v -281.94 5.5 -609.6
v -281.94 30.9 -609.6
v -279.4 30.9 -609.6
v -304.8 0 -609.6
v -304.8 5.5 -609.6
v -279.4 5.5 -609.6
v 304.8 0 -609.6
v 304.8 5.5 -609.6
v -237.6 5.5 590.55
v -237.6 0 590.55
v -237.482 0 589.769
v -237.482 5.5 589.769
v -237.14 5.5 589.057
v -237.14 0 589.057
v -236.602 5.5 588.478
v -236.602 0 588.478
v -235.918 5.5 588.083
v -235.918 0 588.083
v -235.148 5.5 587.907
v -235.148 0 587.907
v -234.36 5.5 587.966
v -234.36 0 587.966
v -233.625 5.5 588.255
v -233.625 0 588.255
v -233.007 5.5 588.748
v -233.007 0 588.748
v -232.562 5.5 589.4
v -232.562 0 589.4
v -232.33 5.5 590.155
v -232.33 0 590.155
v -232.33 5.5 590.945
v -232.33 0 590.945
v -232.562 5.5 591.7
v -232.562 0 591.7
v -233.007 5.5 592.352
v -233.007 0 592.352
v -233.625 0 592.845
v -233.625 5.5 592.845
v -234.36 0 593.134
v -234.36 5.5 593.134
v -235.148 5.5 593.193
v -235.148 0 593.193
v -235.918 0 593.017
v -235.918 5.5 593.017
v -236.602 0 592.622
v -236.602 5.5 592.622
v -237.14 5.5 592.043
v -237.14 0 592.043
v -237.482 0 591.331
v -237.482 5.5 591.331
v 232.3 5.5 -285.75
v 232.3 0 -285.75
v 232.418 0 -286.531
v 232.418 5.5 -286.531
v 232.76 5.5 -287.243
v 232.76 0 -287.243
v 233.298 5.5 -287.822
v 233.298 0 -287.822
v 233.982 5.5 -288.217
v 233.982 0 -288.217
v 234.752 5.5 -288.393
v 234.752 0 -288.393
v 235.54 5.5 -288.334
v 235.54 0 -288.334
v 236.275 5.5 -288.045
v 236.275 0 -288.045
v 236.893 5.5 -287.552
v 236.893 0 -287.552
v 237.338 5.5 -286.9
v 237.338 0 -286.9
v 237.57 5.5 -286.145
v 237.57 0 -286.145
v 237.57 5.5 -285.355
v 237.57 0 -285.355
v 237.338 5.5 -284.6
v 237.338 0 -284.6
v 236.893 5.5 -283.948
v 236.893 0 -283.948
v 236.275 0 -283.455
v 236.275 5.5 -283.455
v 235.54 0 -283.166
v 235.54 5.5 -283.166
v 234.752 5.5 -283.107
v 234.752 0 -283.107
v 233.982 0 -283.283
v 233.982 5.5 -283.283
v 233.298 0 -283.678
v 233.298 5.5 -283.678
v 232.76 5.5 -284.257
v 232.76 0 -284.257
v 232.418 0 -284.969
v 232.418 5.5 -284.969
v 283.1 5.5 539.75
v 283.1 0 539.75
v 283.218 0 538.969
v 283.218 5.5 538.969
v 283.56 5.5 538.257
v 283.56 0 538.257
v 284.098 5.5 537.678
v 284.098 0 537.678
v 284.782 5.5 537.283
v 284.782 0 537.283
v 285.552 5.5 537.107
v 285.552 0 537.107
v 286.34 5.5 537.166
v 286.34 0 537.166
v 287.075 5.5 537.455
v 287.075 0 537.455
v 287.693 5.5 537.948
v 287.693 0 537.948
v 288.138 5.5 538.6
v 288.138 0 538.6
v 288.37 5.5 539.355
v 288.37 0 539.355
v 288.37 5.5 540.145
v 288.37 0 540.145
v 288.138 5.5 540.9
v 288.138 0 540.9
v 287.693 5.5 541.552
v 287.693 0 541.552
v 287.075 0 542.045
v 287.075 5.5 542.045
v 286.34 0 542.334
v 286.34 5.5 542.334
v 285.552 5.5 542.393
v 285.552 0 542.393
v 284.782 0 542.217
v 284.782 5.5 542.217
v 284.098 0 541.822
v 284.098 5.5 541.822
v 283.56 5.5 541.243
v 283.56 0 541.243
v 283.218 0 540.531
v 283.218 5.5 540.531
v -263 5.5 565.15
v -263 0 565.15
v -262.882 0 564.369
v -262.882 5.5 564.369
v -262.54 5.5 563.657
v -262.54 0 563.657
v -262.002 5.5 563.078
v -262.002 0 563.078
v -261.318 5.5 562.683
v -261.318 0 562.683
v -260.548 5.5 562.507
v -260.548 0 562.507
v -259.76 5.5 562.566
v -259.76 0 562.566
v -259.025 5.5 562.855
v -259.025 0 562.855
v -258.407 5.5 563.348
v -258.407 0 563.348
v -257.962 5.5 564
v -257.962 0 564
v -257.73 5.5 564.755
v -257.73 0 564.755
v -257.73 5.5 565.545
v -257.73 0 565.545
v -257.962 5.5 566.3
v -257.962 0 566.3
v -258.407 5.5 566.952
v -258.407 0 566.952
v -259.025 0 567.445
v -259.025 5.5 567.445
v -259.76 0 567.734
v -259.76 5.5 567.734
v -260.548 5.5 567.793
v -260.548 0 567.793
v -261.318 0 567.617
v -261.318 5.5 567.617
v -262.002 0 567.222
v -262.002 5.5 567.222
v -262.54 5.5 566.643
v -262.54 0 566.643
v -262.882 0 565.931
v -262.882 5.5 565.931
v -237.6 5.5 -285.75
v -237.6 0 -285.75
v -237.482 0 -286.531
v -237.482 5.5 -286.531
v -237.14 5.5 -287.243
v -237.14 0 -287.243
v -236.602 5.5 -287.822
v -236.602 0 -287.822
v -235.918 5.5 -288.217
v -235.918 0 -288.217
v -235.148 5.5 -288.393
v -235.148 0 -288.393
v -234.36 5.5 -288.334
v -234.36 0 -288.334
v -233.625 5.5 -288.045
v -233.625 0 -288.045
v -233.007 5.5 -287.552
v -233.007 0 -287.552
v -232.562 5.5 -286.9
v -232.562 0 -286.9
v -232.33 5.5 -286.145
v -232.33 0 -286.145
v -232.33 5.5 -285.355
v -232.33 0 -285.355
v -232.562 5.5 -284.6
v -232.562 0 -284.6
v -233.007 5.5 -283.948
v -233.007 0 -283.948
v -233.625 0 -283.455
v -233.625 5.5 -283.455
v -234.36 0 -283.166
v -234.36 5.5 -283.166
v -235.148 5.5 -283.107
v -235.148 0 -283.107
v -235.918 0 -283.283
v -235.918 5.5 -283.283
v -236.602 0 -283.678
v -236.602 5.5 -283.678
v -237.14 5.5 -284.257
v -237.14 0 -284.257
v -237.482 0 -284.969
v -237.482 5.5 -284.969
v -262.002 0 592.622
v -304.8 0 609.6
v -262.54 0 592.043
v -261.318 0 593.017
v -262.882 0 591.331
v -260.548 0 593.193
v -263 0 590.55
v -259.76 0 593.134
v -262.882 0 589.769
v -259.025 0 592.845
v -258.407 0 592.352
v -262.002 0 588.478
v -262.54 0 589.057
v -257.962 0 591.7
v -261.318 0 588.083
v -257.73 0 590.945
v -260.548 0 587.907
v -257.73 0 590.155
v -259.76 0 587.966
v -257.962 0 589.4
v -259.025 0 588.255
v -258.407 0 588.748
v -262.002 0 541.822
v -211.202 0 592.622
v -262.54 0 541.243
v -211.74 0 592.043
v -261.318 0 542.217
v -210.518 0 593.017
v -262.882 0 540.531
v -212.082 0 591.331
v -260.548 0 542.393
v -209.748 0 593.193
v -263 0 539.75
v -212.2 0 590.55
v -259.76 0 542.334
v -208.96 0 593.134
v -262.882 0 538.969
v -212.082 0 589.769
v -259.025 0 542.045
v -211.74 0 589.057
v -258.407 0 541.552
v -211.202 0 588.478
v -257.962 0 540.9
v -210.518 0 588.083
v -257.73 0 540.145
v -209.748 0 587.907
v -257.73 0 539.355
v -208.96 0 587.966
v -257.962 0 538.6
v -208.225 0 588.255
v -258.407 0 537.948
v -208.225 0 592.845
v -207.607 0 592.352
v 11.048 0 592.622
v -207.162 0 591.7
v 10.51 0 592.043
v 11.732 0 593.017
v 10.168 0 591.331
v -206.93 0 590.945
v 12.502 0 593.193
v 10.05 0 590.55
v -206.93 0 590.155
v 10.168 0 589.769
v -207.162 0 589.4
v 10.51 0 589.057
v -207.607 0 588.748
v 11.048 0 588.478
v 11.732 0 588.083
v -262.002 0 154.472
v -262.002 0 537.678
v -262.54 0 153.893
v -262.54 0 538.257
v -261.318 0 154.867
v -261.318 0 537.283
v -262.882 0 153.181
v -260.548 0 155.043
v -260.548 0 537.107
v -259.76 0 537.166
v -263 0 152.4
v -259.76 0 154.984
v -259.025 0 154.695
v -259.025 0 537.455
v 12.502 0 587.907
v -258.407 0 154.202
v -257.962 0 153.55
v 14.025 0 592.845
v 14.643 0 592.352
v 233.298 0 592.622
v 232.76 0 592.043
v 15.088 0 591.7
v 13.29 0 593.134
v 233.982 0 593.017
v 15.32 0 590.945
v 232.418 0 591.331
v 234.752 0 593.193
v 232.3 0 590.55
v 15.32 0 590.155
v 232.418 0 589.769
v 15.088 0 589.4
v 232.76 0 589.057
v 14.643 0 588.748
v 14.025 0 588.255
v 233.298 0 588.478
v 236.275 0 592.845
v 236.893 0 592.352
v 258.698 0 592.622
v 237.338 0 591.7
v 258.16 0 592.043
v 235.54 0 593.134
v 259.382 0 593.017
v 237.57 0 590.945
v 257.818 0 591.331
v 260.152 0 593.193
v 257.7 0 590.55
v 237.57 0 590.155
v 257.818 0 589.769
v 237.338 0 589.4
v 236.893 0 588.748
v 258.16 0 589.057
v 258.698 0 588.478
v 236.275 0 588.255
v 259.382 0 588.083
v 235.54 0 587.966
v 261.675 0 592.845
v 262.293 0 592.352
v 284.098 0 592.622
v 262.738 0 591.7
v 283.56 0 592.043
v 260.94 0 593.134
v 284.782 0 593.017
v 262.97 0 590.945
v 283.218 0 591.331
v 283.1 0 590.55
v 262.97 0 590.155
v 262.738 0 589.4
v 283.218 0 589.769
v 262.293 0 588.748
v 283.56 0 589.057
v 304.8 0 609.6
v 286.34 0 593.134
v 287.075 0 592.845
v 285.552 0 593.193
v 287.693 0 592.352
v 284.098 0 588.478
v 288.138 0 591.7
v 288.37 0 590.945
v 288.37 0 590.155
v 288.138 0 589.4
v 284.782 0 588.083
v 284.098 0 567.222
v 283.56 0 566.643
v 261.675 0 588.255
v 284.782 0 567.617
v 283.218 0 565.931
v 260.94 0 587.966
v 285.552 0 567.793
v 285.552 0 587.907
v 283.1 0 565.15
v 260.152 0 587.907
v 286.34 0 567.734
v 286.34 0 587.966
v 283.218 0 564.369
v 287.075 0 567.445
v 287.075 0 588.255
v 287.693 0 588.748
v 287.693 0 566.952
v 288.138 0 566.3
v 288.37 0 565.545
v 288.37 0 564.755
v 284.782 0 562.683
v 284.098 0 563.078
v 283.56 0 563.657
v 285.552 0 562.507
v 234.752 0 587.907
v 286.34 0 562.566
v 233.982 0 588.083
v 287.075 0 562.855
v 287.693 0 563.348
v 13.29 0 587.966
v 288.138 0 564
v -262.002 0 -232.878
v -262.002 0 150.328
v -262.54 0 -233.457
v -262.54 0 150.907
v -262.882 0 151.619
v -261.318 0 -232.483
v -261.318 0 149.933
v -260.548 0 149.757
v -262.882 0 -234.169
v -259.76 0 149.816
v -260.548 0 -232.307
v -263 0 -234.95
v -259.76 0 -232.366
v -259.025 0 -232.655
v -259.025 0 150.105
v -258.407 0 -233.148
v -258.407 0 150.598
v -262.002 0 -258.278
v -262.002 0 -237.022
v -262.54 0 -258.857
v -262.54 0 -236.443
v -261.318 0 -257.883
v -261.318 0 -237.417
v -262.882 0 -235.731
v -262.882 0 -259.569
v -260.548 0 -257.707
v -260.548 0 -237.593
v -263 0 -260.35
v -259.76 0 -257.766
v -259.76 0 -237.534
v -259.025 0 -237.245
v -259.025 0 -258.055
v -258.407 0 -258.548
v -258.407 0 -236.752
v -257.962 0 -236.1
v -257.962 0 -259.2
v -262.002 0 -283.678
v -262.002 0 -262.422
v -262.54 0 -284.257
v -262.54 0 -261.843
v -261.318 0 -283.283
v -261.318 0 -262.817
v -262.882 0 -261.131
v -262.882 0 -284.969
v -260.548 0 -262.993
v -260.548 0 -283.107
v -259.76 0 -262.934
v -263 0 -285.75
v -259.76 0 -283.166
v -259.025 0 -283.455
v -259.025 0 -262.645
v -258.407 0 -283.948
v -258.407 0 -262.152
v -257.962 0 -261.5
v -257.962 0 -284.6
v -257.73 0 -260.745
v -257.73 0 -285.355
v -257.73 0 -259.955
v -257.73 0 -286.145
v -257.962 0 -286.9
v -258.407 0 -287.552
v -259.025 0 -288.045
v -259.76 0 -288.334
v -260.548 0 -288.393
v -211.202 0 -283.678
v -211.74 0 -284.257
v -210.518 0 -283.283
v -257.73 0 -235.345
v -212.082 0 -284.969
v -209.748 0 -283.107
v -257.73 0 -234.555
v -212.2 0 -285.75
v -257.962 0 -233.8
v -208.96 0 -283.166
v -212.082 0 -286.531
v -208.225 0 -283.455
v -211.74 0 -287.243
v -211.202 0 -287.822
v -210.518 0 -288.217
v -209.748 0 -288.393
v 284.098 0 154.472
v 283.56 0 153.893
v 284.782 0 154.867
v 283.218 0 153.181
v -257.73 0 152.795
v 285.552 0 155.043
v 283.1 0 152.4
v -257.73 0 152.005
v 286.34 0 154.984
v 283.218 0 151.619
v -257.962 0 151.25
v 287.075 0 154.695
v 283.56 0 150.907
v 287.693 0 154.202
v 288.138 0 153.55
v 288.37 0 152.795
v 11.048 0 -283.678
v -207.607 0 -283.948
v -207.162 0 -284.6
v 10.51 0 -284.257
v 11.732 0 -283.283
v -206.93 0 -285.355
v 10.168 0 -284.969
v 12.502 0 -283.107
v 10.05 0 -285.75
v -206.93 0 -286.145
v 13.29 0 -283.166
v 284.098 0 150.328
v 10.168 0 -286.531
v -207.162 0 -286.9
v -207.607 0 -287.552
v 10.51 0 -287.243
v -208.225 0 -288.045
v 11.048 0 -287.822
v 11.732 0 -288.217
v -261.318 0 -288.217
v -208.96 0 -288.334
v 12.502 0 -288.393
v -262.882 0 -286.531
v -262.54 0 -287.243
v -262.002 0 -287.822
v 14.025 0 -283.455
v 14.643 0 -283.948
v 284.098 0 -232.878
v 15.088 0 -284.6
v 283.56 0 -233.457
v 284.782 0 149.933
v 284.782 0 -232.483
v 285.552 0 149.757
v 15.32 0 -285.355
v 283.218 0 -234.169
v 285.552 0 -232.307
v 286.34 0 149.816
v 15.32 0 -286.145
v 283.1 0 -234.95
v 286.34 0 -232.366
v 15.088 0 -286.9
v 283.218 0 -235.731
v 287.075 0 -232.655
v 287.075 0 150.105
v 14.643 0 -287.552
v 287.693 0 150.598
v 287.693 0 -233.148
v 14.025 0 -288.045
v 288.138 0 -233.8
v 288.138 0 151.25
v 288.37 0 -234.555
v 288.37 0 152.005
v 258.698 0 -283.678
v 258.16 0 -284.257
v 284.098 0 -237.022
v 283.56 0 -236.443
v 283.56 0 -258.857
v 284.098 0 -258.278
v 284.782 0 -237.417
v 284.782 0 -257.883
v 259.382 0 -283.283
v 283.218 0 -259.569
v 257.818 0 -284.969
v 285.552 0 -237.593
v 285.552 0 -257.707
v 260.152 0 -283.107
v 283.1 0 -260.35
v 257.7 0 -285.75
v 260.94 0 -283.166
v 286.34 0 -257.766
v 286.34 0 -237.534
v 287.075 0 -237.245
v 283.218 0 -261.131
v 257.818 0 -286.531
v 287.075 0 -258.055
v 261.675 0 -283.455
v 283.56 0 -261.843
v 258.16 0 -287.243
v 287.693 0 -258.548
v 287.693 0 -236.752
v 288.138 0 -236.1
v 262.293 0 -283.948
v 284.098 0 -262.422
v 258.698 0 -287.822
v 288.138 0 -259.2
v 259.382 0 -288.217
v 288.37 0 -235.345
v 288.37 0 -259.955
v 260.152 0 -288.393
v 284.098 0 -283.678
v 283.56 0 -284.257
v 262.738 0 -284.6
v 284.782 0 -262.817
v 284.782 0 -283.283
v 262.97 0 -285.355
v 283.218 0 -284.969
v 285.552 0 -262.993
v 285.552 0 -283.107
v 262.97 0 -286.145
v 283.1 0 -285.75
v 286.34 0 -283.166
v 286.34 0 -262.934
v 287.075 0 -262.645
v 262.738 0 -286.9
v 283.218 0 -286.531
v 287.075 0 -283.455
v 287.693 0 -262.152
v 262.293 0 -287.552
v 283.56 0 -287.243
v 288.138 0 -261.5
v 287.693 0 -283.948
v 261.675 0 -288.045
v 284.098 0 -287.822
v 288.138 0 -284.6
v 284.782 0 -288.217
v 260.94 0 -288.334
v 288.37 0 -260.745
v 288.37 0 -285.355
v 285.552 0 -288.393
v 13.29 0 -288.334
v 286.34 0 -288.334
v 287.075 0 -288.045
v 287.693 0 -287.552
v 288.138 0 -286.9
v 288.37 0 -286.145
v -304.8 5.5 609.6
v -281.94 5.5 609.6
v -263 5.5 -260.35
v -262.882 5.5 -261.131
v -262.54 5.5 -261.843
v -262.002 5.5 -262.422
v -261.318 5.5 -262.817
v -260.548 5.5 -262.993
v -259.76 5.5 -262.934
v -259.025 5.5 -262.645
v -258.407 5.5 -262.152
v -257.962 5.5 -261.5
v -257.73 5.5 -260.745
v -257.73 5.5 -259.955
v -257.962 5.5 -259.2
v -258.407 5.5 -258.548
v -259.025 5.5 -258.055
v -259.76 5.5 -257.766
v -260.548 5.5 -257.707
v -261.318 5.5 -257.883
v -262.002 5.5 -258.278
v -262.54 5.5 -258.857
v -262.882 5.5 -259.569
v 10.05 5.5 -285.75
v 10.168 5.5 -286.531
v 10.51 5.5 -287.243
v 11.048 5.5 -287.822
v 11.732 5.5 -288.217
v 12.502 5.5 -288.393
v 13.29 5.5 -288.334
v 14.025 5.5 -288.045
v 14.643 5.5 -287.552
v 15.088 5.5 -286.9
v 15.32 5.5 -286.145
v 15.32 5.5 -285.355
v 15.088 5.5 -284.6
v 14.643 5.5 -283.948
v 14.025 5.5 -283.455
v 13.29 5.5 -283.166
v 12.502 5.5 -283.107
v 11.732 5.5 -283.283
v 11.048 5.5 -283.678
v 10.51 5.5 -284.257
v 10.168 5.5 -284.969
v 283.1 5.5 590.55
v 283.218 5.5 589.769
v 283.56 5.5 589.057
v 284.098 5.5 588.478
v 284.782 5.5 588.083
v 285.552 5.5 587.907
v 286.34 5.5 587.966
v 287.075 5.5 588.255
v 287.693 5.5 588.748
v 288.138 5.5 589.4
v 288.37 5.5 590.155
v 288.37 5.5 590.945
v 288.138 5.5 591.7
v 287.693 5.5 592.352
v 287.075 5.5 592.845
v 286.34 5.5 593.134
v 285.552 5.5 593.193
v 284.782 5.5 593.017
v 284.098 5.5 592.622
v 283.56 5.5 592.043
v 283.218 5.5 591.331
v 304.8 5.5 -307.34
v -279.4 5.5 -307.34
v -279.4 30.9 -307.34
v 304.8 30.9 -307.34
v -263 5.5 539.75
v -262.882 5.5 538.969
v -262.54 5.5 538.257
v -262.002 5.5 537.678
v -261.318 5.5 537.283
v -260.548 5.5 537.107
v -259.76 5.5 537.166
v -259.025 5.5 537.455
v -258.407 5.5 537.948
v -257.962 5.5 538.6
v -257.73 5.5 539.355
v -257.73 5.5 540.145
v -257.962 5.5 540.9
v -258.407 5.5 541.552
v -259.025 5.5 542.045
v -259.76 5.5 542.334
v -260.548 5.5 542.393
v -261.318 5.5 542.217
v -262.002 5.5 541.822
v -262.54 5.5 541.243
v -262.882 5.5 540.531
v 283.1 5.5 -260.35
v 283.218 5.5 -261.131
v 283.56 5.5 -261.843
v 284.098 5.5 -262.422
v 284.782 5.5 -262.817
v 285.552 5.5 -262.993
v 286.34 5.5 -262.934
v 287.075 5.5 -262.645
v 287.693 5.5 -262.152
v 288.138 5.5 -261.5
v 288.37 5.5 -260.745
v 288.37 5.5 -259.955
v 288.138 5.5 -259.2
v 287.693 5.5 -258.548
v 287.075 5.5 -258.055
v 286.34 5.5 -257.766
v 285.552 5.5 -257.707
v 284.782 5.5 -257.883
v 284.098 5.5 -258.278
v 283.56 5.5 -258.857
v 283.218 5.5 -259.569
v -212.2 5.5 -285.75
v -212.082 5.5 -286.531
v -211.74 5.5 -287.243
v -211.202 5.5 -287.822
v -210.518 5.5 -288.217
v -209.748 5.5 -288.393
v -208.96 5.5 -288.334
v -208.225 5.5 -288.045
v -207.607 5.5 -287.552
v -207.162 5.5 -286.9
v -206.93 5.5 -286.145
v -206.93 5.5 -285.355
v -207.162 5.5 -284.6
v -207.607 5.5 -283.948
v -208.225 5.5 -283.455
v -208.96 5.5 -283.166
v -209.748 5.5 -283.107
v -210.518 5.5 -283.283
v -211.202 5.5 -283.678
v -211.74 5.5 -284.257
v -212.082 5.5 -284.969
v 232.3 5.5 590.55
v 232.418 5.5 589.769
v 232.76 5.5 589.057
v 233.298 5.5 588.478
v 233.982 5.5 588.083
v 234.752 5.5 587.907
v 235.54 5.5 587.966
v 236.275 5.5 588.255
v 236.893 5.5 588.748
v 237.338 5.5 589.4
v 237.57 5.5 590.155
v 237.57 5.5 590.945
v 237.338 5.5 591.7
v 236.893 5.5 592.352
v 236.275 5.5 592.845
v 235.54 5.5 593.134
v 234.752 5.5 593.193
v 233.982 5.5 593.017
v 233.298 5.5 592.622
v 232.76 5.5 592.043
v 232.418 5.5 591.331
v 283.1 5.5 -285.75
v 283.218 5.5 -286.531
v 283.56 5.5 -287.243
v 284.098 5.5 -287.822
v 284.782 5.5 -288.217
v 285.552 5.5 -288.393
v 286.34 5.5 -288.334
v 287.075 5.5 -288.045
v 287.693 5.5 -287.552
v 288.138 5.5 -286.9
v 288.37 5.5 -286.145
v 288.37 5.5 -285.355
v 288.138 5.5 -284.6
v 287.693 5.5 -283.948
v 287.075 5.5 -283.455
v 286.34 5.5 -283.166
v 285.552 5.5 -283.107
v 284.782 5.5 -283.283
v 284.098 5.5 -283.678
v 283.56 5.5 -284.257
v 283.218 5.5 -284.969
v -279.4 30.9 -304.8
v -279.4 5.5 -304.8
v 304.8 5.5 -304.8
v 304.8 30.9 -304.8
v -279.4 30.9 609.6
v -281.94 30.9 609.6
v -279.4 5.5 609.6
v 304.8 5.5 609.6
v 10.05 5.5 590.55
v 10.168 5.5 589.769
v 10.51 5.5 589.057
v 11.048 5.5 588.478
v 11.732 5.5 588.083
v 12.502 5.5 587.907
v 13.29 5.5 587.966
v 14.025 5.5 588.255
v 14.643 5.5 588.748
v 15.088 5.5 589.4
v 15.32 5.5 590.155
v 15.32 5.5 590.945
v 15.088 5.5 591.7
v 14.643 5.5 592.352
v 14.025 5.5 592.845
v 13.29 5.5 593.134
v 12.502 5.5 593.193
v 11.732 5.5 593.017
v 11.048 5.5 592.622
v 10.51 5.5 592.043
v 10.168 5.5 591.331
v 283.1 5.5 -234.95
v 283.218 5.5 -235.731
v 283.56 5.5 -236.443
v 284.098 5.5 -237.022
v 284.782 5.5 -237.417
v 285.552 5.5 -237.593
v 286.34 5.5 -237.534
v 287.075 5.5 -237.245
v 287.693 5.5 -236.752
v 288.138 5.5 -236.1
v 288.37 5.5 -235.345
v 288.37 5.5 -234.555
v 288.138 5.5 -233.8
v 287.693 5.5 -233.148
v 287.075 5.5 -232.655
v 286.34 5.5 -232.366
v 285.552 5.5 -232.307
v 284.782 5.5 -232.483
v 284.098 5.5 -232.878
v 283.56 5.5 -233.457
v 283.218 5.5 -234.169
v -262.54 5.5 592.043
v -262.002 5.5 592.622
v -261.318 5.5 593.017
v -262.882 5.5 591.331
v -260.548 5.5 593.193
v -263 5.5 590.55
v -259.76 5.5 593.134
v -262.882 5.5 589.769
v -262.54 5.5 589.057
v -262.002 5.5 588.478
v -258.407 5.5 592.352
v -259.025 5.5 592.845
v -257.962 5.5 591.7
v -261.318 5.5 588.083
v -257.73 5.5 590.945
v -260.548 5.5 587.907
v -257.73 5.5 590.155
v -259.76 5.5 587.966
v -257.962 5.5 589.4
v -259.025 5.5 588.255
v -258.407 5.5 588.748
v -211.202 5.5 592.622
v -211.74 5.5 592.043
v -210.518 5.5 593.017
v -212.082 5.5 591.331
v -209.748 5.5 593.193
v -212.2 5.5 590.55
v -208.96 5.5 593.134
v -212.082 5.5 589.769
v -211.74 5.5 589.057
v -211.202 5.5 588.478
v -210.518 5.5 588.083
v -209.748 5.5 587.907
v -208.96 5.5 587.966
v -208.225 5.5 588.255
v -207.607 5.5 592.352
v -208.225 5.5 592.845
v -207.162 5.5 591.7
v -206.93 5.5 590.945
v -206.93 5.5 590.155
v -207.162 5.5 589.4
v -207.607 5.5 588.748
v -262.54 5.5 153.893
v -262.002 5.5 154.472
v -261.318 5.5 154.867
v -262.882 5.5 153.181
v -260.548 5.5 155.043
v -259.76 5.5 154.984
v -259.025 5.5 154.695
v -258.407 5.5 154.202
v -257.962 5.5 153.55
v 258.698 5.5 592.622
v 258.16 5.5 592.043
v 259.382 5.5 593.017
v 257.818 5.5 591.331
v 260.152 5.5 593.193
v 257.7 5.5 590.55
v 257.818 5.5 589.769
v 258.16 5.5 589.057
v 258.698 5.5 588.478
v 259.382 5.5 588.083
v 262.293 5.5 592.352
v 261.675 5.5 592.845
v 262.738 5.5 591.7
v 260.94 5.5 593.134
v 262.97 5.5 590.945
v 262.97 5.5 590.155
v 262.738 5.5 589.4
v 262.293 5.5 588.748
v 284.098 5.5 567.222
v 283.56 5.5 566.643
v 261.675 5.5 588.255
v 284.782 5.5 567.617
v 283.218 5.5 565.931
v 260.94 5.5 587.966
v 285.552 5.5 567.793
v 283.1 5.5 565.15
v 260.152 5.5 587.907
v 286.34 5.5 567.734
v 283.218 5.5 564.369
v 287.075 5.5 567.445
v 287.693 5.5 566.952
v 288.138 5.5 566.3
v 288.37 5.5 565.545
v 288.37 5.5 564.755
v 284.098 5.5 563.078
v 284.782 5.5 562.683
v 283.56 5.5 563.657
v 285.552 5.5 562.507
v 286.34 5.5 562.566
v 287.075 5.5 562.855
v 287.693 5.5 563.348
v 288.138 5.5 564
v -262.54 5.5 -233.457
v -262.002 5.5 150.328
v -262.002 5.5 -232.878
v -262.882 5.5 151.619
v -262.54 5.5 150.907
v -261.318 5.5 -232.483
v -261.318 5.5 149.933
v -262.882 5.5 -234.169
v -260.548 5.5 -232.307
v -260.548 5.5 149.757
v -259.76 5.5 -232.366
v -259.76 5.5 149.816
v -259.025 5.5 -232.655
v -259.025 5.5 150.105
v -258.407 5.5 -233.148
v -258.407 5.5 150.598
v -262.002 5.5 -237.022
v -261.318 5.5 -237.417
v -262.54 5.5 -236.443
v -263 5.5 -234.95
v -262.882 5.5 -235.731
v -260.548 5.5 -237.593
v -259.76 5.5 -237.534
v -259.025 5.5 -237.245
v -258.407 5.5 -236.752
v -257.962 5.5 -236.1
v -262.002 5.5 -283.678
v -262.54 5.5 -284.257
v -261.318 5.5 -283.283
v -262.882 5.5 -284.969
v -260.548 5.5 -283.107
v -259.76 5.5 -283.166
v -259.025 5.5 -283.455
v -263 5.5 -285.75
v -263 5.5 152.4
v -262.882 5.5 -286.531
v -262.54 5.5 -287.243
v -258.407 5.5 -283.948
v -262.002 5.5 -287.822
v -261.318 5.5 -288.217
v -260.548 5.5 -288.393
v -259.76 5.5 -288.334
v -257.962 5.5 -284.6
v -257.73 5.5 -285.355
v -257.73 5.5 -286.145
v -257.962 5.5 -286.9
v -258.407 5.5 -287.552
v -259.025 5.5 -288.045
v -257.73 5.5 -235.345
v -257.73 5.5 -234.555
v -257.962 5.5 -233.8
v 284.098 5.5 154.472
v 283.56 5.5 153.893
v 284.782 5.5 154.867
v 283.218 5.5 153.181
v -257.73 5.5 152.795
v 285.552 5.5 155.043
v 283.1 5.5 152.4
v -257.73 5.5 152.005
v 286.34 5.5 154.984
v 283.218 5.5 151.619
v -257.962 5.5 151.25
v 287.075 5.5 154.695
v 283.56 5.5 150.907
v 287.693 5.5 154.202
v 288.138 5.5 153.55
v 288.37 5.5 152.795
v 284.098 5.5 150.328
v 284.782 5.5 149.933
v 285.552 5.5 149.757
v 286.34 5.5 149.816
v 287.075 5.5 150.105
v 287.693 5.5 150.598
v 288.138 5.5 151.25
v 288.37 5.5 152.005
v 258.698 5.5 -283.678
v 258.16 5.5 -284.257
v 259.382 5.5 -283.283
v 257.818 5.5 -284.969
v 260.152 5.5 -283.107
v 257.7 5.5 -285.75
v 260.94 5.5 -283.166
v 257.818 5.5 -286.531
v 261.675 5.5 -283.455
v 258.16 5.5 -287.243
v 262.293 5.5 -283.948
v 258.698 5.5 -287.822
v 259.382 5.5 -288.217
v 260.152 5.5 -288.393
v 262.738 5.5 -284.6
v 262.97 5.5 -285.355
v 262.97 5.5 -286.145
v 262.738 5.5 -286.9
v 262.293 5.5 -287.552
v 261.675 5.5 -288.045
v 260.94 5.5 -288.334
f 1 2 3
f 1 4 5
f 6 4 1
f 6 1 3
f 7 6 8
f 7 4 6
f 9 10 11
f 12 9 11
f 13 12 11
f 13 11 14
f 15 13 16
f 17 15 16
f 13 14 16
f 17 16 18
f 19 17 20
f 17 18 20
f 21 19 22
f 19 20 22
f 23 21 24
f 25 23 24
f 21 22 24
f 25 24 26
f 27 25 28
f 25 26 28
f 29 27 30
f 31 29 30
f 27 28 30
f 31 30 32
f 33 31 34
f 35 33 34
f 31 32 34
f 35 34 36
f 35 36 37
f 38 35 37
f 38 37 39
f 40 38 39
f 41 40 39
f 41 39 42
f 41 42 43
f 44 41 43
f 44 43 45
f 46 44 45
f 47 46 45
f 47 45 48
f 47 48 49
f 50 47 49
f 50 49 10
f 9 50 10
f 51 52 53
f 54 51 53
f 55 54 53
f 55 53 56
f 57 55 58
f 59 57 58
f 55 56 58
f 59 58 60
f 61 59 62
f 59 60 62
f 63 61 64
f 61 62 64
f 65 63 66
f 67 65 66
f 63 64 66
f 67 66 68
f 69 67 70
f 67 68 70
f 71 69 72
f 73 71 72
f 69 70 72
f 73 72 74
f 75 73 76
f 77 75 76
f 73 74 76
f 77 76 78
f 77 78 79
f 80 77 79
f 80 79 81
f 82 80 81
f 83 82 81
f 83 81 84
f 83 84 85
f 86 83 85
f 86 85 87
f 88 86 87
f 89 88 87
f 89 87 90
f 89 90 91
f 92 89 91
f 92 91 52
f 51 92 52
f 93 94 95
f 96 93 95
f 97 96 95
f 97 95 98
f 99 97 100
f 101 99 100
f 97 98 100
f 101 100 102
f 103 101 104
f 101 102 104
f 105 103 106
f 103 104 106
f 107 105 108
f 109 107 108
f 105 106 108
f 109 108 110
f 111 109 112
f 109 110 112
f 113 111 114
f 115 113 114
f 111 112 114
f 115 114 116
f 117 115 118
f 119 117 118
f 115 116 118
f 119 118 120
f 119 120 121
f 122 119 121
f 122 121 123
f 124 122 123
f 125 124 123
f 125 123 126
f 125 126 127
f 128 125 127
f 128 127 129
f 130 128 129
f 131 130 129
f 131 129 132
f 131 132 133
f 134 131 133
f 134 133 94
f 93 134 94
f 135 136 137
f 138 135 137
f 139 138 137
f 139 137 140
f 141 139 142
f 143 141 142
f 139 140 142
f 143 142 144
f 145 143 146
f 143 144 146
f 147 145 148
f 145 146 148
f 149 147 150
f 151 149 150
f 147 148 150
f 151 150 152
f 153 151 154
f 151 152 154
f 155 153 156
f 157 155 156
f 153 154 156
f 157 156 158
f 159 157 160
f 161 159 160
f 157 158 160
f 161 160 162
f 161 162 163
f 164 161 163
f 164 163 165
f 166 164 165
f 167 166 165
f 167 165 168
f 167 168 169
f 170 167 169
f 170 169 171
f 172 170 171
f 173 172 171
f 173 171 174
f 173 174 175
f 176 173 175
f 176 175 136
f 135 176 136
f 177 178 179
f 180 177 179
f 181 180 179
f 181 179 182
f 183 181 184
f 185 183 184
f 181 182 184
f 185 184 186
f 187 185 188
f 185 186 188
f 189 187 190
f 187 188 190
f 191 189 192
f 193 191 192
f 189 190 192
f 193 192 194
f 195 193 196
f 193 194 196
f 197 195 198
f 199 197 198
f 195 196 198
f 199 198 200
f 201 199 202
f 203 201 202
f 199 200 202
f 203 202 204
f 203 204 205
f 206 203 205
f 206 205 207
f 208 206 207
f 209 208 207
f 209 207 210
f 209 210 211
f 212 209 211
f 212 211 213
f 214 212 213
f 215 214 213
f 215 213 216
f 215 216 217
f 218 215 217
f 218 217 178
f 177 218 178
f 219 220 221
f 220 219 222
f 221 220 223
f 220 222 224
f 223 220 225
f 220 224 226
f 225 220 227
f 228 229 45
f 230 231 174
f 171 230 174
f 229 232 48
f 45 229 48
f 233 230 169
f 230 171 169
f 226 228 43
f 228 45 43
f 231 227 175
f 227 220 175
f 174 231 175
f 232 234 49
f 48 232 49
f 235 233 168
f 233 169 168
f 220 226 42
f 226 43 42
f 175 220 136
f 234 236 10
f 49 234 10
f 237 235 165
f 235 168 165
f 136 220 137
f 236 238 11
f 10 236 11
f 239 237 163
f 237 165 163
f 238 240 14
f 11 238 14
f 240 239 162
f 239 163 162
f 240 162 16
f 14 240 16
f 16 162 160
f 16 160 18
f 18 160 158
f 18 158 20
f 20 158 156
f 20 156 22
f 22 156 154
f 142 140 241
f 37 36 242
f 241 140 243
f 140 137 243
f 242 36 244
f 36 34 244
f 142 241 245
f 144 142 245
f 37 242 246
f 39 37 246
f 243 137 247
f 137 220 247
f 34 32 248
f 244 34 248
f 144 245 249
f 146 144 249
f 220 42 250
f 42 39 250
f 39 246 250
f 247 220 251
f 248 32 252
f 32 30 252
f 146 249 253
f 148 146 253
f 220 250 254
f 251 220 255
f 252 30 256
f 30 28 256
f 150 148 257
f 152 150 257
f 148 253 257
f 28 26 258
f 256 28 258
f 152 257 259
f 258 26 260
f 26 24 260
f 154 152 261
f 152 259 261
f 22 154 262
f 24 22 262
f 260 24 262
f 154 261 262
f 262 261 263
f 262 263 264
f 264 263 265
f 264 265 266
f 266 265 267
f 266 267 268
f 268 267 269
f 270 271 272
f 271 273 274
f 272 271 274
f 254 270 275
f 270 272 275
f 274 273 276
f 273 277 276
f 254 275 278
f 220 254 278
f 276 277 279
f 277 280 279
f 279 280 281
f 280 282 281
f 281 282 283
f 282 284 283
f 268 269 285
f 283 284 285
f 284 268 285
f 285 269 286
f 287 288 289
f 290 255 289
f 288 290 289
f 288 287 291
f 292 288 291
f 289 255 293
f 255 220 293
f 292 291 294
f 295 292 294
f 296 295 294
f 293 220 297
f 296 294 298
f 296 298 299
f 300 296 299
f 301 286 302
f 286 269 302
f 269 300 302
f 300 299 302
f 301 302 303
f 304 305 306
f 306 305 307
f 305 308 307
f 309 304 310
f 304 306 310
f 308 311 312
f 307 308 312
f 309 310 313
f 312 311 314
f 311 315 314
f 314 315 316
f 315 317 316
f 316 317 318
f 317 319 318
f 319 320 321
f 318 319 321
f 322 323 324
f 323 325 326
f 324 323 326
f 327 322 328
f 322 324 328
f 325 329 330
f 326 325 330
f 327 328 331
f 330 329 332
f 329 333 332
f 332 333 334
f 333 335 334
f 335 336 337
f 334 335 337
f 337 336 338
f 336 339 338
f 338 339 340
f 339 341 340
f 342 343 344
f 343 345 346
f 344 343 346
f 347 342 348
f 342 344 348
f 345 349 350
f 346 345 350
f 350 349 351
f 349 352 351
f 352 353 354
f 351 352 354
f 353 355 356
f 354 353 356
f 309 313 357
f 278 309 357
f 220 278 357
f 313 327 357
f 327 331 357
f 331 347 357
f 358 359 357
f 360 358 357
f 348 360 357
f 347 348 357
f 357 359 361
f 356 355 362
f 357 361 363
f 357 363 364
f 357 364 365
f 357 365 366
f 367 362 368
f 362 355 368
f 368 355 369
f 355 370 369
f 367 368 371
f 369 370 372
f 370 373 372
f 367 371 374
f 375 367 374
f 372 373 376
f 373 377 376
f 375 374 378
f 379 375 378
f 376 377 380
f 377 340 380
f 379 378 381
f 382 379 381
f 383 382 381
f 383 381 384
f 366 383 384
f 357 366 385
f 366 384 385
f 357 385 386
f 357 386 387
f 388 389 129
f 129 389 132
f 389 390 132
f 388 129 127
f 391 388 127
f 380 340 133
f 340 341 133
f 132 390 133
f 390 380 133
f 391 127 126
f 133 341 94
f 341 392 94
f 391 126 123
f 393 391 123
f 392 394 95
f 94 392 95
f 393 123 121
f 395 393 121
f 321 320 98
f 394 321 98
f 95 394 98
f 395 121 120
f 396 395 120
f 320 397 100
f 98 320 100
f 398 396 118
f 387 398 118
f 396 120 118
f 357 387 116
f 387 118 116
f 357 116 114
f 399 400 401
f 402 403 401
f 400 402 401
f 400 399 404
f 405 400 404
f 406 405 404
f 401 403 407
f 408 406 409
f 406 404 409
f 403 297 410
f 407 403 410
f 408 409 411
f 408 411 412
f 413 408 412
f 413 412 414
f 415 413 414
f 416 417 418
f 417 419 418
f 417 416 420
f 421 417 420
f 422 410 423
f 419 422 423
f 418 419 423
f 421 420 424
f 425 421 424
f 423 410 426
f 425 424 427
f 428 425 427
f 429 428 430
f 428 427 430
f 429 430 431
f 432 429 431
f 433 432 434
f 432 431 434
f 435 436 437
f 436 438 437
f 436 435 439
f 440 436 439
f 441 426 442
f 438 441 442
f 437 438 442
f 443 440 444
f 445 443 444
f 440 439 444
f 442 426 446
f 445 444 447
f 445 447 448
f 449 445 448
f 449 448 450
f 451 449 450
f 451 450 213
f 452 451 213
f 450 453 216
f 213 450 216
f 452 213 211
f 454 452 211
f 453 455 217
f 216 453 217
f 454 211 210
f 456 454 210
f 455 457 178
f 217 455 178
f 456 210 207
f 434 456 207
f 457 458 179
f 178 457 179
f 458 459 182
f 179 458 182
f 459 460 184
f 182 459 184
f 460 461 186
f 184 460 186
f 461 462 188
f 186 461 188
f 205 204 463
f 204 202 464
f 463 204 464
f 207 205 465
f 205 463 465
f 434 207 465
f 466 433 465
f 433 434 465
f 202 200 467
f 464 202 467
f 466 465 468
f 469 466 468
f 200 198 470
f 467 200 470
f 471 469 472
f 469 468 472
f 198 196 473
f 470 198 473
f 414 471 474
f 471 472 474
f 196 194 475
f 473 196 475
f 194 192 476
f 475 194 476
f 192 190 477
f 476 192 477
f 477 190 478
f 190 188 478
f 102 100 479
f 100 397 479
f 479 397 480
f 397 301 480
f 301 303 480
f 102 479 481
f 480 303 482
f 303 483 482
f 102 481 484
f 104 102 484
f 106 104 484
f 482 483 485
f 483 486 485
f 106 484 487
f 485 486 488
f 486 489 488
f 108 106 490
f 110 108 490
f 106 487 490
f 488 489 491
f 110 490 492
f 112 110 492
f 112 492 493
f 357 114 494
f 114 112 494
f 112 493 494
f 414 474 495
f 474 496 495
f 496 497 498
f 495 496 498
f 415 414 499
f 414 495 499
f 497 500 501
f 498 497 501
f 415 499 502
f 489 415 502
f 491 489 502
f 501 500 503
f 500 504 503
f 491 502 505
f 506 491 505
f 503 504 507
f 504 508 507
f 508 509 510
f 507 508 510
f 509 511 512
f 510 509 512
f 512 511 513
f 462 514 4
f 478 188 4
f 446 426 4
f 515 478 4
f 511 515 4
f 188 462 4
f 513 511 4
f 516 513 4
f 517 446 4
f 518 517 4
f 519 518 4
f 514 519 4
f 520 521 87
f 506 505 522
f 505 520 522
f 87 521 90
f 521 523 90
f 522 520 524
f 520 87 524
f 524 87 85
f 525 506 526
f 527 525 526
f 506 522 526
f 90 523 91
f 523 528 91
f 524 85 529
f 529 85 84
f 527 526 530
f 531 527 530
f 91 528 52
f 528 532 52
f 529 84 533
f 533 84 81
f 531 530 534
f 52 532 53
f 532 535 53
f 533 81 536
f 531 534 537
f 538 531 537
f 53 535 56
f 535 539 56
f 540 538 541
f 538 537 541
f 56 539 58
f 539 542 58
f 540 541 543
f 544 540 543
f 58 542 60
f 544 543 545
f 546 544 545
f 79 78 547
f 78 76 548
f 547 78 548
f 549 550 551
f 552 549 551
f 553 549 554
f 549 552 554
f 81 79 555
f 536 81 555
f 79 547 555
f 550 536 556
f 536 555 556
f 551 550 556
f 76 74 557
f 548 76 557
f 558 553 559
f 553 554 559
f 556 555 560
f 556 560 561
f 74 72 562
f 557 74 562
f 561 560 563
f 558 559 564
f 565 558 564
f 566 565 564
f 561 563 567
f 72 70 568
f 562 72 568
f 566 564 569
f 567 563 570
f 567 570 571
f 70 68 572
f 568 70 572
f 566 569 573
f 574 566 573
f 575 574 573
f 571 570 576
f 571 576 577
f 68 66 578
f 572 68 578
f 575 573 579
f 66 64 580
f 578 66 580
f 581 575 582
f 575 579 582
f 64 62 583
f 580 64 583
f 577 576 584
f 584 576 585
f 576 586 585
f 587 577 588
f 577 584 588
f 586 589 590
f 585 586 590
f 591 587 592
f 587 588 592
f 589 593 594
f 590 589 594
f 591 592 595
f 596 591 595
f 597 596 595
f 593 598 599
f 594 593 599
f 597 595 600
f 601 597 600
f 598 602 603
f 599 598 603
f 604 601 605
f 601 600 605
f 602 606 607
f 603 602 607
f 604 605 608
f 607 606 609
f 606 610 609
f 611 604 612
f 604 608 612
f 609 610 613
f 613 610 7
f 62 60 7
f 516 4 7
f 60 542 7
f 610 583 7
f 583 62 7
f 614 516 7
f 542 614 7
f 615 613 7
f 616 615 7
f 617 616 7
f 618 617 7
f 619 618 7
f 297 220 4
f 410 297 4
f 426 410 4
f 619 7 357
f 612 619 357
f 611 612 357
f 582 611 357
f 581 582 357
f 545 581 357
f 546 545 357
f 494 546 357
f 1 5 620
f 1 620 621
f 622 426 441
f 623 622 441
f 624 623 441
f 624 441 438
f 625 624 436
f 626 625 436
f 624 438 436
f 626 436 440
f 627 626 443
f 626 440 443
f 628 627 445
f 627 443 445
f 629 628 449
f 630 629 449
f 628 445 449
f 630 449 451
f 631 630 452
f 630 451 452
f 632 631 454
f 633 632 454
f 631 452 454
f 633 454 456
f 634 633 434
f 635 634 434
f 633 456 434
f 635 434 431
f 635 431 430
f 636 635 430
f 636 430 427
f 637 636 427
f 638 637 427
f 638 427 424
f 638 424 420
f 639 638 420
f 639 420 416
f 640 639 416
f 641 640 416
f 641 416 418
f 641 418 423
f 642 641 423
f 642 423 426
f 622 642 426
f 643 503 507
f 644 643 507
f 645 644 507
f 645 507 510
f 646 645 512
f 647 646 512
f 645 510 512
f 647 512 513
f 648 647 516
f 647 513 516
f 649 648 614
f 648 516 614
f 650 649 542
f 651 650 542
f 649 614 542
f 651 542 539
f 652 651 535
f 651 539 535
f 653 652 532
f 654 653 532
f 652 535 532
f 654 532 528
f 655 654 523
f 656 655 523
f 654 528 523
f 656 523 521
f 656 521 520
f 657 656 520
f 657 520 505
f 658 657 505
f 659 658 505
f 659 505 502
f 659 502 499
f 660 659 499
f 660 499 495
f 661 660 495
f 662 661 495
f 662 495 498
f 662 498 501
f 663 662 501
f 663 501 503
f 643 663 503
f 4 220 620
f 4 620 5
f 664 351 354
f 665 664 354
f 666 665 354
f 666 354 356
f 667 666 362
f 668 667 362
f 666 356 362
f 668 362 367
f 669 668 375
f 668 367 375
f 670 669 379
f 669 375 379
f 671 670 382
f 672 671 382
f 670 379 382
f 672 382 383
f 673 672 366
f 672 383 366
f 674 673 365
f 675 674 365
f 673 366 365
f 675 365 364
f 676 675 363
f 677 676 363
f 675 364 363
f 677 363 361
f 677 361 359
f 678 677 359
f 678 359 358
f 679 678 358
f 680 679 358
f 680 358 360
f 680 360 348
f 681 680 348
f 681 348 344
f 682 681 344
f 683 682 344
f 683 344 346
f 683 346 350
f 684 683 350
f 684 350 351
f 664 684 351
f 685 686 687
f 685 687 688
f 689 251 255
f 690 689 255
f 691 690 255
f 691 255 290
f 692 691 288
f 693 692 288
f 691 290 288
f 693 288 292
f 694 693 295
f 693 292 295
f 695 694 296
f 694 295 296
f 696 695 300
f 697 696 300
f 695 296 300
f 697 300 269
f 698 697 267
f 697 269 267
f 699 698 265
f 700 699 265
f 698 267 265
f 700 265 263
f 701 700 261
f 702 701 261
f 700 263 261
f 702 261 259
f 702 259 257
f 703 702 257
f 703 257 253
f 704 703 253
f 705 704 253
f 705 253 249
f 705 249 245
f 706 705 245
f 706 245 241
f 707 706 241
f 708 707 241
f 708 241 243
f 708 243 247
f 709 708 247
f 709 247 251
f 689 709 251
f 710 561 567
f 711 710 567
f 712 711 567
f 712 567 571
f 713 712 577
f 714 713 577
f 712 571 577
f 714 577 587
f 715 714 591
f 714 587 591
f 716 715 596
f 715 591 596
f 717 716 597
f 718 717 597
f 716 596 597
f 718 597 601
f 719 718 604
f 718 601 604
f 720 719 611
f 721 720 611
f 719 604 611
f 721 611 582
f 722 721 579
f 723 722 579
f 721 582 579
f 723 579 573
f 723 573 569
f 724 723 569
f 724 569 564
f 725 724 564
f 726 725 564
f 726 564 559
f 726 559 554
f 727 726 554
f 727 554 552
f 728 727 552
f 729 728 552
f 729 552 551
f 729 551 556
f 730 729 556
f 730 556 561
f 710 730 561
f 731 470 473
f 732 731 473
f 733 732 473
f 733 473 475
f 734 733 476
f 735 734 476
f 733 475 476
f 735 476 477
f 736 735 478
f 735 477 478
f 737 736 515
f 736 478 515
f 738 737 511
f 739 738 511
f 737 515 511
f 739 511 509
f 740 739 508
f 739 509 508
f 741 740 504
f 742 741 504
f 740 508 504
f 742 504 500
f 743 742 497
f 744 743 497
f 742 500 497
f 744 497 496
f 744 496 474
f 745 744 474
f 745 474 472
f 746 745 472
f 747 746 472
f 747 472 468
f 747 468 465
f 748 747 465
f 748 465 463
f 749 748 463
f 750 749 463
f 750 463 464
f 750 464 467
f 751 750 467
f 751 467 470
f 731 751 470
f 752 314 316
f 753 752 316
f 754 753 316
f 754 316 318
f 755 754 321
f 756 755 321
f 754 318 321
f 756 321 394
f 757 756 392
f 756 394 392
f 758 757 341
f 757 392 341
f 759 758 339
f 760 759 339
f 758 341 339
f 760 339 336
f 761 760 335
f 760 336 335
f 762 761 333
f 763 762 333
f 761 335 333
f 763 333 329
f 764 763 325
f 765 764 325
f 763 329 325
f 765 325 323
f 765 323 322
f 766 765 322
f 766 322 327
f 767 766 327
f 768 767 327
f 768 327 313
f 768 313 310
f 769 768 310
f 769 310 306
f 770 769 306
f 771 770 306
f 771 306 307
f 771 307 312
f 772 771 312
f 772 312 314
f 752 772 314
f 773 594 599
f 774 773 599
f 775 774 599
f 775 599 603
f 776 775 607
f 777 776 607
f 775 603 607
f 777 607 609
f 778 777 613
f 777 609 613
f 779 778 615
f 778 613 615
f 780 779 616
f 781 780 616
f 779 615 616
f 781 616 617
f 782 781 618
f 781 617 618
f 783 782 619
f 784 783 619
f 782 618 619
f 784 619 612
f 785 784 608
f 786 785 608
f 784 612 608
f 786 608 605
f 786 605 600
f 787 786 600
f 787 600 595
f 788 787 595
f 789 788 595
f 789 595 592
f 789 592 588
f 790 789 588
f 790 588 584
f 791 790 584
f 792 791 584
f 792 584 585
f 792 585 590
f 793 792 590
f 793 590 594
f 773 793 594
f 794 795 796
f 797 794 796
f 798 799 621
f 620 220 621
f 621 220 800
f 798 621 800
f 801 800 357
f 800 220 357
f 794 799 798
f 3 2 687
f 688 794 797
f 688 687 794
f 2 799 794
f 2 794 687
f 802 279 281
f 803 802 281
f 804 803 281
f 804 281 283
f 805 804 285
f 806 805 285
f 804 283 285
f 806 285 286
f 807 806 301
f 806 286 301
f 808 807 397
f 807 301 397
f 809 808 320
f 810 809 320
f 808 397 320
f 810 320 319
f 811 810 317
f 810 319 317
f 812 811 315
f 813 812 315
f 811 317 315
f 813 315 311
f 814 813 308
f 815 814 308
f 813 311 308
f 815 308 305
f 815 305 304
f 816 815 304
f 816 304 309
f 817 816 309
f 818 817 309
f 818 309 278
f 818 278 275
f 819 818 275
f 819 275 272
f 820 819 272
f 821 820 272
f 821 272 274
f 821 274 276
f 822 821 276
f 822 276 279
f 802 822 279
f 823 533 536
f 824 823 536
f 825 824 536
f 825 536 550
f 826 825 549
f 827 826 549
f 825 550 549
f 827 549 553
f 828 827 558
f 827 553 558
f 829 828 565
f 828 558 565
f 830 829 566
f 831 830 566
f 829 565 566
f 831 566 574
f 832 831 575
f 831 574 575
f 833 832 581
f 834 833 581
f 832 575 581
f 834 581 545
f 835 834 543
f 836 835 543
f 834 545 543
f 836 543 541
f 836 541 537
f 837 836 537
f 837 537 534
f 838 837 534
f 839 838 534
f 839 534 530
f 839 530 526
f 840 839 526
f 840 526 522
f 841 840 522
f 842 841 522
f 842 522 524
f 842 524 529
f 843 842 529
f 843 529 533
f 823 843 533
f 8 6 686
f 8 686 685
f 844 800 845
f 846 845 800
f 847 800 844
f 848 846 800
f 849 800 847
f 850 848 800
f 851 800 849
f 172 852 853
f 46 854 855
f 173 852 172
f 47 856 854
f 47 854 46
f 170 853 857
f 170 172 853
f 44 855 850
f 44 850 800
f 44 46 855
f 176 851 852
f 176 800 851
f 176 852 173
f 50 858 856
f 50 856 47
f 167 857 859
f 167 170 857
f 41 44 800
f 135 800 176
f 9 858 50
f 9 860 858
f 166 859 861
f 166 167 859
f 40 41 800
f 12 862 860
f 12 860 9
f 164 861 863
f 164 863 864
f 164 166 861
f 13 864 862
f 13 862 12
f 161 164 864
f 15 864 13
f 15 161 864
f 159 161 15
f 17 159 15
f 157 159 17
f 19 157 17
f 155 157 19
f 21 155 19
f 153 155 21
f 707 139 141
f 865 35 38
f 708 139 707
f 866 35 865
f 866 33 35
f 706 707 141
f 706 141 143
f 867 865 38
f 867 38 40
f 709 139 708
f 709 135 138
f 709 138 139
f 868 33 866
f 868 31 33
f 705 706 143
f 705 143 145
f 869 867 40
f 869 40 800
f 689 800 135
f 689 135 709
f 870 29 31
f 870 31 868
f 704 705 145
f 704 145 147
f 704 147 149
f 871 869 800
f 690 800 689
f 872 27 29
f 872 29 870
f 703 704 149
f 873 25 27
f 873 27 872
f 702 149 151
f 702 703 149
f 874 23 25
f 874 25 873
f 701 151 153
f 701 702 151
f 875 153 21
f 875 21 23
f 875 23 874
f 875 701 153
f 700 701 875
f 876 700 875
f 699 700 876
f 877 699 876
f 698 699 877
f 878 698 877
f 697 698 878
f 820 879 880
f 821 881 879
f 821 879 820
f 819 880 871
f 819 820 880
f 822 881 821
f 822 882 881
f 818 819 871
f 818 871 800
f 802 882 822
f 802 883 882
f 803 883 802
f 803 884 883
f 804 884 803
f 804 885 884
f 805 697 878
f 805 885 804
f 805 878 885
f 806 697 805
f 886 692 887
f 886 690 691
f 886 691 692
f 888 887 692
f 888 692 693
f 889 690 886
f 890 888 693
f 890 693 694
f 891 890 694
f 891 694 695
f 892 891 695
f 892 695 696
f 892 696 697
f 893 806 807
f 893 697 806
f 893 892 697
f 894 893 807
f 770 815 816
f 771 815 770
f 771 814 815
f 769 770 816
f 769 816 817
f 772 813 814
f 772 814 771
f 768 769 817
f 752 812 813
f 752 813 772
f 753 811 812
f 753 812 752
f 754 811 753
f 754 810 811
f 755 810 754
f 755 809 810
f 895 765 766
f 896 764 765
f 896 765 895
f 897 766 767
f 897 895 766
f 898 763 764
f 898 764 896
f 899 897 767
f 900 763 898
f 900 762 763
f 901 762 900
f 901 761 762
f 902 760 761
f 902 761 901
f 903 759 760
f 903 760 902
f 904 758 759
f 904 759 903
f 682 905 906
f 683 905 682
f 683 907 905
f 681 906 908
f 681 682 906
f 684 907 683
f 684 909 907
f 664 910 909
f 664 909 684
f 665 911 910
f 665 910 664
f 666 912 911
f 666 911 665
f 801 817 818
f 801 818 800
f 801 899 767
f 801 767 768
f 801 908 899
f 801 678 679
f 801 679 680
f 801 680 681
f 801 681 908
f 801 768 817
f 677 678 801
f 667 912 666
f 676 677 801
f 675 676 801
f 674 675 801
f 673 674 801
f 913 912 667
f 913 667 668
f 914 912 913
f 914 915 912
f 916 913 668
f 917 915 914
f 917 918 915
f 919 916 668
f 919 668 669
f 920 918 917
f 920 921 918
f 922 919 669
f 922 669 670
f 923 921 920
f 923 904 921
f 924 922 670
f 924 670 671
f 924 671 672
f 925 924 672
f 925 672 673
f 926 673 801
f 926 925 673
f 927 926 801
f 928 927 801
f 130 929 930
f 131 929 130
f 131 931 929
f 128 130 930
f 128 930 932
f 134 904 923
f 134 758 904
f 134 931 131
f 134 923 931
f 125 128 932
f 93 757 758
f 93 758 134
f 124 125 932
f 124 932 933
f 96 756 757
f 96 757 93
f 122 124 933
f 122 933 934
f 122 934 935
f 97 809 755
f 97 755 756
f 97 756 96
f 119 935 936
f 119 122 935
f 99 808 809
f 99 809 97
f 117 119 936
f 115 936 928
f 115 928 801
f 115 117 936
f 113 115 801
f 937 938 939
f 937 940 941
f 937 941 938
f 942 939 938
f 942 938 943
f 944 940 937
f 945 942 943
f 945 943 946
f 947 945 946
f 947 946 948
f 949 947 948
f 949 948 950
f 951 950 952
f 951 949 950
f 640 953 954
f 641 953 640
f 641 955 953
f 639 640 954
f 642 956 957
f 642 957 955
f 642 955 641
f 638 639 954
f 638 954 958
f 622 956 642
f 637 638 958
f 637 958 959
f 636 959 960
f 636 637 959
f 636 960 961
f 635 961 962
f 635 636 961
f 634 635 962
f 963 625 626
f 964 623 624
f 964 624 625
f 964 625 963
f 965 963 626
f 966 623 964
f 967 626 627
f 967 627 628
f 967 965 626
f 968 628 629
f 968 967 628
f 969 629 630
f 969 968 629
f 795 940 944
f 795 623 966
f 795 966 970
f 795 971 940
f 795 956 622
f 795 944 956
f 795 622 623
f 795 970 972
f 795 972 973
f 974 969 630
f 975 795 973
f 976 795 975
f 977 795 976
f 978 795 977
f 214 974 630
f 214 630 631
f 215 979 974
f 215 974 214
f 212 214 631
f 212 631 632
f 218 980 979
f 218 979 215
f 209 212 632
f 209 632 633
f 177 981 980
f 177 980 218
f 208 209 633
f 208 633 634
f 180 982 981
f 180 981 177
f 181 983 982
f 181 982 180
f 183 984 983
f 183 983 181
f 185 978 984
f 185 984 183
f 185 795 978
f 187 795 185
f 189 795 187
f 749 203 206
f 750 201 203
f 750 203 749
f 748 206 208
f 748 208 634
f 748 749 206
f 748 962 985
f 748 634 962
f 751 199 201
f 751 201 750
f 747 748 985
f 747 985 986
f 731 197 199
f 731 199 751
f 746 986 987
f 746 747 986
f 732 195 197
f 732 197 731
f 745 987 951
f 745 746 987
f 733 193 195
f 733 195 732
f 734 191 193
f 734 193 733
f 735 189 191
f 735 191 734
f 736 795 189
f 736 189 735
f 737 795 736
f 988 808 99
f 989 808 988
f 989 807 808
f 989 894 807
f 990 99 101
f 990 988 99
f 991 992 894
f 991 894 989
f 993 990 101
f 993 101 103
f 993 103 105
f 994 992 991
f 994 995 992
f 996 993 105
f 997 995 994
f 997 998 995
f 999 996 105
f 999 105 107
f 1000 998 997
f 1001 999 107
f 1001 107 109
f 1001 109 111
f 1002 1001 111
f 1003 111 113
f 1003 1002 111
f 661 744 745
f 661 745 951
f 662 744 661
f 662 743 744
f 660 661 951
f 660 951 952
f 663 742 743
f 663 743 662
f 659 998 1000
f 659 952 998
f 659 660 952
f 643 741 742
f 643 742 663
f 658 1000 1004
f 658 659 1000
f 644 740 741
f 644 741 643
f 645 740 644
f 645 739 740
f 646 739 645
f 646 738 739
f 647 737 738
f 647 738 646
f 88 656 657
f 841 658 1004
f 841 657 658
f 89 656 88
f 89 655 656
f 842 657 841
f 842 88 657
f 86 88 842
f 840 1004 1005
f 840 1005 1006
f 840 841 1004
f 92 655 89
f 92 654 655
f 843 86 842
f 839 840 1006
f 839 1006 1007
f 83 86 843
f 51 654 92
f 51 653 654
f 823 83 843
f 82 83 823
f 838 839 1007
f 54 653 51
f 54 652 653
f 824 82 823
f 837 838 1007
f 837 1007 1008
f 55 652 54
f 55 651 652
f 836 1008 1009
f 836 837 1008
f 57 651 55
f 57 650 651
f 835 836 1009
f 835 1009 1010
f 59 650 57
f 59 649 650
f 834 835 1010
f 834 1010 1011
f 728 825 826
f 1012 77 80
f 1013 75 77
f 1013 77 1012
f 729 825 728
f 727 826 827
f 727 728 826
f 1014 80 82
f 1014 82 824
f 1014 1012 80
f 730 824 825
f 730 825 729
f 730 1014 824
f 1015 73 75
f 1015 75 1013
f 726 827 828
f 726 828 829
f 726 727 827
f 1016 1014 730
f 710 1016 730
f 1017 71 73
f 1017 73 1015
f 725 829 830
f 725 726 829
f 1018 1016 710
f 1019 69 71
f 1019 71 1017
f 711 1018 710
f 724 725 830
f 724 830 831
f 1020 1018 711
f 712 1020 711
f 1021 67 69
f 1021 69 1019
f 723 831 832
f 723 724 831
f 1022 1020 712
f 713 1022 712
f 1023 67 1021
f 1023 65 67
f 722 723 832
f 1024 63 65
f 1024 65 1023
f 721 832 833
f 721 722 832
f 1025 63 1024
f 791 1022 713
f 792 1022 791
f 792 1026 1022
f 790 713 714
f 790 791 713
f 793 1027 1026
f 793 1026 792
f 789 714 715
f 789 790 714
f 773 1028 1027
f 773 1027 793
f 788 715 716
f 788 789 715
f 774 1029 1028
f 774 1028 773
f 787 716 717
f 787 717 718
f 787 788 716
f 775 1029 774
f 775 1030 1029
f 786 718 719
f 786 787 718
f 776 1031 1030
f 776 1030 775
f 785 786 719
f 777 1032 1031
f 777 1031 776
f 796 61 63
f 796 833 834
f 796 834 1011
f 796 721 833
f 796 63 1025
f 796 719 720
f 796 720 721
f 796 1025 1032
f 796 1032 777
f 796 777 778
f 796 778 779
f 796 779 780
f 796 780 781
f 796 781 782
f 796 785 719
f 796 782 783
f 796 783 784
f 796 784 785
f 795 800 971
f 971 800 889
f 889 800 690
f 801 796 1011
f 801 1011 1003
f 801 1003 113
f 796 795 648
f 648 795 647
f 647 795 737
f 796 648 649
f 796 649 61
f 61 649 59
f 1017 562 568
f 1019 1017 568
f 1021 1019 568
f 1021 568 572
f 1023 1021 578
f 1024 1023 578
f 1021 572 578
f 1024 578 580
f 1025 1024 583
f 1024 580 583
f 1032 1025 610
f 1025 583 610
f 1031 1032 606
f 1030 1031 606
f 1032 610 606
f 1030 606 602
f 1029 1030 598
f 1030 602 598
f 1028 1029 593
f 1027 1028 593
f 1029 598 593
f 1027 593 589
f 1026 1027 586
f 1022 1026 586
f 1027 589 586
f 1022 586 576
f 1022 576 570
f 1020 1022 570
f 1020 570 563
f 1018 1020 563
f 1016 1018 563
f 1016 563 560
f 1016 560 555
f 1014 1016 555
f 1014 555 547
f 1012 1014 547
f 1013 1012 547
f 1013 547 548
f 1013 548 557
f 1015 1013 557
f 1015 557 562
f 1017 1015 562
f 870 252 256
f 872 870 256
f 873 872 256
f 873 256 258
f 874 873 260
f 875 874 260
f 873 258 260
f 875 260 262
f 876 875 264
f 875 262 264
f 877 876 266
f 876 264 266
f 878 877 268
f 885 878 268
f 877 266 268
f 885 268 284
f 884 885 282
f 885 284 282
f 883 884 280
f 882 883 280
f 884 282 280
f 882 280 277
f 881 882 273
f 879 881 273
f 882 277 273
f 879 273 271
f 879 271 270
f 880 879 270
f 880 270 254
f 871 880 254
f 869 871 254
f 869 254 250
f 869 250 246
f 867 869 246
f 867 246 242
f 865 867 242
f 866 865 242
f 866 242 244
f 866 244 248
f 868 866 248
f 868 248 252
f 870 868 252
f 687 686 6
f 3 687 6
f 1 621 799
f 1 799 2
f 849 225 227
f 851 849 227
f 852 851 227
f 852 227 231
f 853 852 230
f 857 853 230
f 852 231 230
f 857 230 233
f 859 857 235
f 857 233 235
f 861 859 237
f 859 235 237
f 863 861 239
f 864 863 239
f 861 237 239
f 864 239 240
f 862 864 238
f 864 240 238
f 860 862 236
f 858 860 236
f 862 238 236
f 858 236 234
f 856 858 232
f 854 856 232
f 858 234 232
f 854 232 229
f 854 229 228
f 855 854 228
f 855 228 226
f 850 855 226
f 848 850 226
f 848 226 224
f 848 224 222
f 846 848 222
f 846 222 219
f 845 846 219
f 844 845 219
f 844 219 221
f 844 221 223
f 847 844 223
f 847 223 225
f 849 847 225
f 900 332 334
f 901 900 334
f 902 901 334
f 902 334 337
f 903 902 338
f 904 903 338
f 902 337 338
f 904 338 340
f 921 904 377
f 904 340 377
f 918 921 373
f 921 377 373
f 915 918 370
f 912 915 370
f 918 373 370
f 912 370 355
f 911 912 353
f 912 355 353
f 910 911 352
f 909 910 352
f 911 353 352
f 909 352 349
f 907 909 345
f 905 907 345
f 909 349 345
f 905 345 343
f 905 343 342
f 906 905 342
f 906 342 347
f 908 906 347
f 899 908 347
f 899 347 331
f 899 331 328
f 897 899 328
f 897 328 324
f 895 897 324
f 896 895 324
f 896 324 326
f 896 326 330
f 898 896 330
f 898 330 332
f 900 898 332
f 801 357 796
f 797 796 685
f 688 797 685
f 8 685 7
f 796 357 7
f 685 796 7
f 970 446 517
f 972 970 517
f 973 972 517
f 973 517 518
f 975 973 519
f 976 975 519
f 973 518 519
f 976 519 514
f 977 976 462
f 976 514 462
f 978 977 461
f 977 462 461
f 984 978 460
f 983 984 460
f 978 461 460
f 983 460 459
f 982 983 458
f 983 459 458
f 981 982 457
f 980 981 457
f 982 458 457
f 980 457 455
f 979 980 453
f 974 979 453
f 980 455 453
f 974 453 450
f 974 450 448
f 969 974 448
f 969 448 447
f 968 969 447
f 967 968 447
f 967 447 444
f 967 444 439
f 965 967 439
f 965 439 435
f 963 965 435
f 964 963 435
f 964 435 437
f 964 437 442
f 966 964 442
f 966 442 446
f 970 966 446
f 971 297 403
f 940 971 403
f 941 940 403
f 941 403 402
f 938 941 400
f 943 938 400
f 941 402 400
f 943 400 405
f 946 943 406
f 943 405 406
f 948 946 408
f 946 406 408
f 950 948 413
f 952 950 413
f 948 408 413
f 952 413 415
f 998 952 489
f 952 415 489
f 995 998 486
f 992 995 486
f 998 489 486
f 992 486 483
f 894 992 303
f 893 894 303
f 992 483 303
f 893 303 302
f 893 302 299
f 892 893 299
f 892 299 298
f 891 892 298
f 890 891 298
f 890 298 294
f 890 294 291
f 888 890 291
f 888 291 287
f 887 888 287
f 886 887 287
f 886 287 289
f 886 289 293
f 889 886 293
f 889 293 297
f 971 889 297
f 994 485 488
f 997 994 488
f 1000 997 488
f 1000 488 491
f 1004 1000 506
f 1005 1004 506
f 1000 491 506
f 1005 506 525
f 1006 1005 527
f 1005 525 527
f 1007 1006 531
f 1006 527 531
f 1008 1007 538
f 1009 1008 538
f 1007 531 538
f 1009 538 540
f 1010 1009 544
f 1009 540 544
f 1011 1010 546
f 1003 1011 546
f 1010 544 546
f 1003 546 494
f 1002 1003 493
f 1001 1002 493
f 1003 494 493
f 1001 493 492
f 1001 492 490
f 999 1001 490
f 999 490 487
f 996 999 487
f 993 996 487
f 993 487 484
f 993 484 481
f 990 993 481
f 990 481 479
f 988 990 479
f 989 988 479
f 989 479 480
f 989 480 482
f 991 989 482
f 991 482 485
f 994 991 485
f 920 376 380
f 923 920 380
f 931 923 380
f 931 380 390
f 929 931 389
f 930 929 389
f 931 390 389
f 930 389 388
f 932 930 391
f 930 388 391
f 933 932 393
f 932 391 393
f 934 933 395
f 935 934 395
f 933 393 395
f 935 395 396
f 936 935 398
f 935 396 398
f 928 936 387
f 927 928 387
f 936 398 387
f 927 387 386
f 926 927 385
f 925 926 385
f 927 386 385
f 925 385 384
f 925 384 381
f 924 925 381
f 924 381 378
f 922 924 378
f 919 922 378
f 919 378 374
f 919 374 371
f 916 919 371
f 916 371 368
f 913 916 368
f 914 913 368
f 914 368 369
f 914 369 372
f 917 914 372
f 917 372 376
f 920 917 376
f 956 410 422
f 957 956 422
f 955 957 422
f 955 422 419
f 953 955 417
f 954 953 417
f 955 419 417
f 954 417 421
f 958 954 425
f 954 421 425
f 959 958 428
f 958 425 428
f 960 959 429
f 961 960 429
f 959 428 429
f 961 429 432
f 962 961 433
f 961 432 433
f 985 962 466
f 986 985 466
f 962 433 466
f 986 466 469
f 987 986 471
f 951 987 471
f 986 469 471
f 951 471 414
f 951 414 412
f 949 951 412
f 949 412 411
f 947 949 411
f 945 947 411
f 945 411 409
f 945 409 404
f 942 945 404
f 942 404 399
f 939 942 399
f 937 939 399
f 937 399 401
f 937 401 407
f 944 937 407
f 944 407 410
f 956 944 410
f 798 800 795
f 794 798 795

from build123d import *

# Parameters (mm, degrees)
SKETCH1_W                  = 609.6
SKETCH1_H                  = 1219.2
BOSS_EXTRUDE1_DEPTH        = 5.5
SKETCH2_W                  = 584.2
SKETCH2_H                  = 2.54
EXTRUDE_THIN1_DEPTH        = 25.4
SKETCH2_3_W                = 2.54
SKETCH2_3_H                = 1219.2
SKETCH2_3_W_2              = 584.2
SKETCH2_3_H_2              = 2.54
EXTRUDE_THIN2_DEPTH        = 25.4
F_5_3_5_3_DIAMETER_HOLE1_D = 5.3


with BuildPart() as part:
    # Sketch1 → Boss-Extrude1 (new body)
    with BuildSketch(Plane(origin=(0, 0, 0), x_dir=(1, 0, 0), z_dir=(0, 1, 0))):
        Rectangle(SKETCH1_W, SKETCH1_H)
    extrude(amount=BOSS_EXTRUDE1_DEPTH)

    # Sketch2 → Extrude-Thin1 (add)
    with BuildSketch(Plane(origin=(0, 5.5, 0), x_dir=(1, 0, 0), z_dir=(0, 1, 0))):
        with Locations((12.7, 306.07)):
            Rectangle(SKETCH2_W, SKETCH2_H)
    extrude(amount=EXTRUDE_THIN1_DEPTH)

    # Sketch2<3> → Extrude-Thin2 (add)
    with BuildSketch(Plane(origin=(0, 5.5, 0), x_dir=(1, 0, 0), z_dir=(0, 1, 0))):
        with Locations((-280.67, 0)):
            Rectangle(SKETCH2_3_W, SKETCH2_3_H)
        with Locations((12.7, 306.07)):
            Rectangle(SKETCH2_3_W_2, SKETCH2_3_H_2)
    extrude(amount=EXTRUDE_THIN2_DEPTH)

    # Ø5.3 (5.3) Diameter Hole1 (through all)
    with Locations(Plane(origin=(0, 5.5, 0), x_dir=(1, 0, 0), z_dir=(0, 1, 0))):
        with Locations((-260.35, 285.75), (-234.95, 285.75), (-209.55, 285.75), (-260.35, 260.35), (-260.35, 234.95), (12.7, 285.75), (234.95, 285.75), (260.35, 285.75), (285.75, 285.75), (285.75, 260.35), (285.75, 234.95), (-260.35, -152.4), (285.75, -152.4), (-260.35, -539.75), (-260.35, -565.15), (-260.35, -590.55), (-234.95, -590.55), (-209.55, -590.55), (12.7, -590.55), (234.95, -590.55), (260.35, -590.55), (285.75, -590.55), (285.75, -565.15), (285.75, -539.75)):
            Hole(F_5_3_5_3_DIAMETER_HOLE1_D / 2)


solid = part.part
